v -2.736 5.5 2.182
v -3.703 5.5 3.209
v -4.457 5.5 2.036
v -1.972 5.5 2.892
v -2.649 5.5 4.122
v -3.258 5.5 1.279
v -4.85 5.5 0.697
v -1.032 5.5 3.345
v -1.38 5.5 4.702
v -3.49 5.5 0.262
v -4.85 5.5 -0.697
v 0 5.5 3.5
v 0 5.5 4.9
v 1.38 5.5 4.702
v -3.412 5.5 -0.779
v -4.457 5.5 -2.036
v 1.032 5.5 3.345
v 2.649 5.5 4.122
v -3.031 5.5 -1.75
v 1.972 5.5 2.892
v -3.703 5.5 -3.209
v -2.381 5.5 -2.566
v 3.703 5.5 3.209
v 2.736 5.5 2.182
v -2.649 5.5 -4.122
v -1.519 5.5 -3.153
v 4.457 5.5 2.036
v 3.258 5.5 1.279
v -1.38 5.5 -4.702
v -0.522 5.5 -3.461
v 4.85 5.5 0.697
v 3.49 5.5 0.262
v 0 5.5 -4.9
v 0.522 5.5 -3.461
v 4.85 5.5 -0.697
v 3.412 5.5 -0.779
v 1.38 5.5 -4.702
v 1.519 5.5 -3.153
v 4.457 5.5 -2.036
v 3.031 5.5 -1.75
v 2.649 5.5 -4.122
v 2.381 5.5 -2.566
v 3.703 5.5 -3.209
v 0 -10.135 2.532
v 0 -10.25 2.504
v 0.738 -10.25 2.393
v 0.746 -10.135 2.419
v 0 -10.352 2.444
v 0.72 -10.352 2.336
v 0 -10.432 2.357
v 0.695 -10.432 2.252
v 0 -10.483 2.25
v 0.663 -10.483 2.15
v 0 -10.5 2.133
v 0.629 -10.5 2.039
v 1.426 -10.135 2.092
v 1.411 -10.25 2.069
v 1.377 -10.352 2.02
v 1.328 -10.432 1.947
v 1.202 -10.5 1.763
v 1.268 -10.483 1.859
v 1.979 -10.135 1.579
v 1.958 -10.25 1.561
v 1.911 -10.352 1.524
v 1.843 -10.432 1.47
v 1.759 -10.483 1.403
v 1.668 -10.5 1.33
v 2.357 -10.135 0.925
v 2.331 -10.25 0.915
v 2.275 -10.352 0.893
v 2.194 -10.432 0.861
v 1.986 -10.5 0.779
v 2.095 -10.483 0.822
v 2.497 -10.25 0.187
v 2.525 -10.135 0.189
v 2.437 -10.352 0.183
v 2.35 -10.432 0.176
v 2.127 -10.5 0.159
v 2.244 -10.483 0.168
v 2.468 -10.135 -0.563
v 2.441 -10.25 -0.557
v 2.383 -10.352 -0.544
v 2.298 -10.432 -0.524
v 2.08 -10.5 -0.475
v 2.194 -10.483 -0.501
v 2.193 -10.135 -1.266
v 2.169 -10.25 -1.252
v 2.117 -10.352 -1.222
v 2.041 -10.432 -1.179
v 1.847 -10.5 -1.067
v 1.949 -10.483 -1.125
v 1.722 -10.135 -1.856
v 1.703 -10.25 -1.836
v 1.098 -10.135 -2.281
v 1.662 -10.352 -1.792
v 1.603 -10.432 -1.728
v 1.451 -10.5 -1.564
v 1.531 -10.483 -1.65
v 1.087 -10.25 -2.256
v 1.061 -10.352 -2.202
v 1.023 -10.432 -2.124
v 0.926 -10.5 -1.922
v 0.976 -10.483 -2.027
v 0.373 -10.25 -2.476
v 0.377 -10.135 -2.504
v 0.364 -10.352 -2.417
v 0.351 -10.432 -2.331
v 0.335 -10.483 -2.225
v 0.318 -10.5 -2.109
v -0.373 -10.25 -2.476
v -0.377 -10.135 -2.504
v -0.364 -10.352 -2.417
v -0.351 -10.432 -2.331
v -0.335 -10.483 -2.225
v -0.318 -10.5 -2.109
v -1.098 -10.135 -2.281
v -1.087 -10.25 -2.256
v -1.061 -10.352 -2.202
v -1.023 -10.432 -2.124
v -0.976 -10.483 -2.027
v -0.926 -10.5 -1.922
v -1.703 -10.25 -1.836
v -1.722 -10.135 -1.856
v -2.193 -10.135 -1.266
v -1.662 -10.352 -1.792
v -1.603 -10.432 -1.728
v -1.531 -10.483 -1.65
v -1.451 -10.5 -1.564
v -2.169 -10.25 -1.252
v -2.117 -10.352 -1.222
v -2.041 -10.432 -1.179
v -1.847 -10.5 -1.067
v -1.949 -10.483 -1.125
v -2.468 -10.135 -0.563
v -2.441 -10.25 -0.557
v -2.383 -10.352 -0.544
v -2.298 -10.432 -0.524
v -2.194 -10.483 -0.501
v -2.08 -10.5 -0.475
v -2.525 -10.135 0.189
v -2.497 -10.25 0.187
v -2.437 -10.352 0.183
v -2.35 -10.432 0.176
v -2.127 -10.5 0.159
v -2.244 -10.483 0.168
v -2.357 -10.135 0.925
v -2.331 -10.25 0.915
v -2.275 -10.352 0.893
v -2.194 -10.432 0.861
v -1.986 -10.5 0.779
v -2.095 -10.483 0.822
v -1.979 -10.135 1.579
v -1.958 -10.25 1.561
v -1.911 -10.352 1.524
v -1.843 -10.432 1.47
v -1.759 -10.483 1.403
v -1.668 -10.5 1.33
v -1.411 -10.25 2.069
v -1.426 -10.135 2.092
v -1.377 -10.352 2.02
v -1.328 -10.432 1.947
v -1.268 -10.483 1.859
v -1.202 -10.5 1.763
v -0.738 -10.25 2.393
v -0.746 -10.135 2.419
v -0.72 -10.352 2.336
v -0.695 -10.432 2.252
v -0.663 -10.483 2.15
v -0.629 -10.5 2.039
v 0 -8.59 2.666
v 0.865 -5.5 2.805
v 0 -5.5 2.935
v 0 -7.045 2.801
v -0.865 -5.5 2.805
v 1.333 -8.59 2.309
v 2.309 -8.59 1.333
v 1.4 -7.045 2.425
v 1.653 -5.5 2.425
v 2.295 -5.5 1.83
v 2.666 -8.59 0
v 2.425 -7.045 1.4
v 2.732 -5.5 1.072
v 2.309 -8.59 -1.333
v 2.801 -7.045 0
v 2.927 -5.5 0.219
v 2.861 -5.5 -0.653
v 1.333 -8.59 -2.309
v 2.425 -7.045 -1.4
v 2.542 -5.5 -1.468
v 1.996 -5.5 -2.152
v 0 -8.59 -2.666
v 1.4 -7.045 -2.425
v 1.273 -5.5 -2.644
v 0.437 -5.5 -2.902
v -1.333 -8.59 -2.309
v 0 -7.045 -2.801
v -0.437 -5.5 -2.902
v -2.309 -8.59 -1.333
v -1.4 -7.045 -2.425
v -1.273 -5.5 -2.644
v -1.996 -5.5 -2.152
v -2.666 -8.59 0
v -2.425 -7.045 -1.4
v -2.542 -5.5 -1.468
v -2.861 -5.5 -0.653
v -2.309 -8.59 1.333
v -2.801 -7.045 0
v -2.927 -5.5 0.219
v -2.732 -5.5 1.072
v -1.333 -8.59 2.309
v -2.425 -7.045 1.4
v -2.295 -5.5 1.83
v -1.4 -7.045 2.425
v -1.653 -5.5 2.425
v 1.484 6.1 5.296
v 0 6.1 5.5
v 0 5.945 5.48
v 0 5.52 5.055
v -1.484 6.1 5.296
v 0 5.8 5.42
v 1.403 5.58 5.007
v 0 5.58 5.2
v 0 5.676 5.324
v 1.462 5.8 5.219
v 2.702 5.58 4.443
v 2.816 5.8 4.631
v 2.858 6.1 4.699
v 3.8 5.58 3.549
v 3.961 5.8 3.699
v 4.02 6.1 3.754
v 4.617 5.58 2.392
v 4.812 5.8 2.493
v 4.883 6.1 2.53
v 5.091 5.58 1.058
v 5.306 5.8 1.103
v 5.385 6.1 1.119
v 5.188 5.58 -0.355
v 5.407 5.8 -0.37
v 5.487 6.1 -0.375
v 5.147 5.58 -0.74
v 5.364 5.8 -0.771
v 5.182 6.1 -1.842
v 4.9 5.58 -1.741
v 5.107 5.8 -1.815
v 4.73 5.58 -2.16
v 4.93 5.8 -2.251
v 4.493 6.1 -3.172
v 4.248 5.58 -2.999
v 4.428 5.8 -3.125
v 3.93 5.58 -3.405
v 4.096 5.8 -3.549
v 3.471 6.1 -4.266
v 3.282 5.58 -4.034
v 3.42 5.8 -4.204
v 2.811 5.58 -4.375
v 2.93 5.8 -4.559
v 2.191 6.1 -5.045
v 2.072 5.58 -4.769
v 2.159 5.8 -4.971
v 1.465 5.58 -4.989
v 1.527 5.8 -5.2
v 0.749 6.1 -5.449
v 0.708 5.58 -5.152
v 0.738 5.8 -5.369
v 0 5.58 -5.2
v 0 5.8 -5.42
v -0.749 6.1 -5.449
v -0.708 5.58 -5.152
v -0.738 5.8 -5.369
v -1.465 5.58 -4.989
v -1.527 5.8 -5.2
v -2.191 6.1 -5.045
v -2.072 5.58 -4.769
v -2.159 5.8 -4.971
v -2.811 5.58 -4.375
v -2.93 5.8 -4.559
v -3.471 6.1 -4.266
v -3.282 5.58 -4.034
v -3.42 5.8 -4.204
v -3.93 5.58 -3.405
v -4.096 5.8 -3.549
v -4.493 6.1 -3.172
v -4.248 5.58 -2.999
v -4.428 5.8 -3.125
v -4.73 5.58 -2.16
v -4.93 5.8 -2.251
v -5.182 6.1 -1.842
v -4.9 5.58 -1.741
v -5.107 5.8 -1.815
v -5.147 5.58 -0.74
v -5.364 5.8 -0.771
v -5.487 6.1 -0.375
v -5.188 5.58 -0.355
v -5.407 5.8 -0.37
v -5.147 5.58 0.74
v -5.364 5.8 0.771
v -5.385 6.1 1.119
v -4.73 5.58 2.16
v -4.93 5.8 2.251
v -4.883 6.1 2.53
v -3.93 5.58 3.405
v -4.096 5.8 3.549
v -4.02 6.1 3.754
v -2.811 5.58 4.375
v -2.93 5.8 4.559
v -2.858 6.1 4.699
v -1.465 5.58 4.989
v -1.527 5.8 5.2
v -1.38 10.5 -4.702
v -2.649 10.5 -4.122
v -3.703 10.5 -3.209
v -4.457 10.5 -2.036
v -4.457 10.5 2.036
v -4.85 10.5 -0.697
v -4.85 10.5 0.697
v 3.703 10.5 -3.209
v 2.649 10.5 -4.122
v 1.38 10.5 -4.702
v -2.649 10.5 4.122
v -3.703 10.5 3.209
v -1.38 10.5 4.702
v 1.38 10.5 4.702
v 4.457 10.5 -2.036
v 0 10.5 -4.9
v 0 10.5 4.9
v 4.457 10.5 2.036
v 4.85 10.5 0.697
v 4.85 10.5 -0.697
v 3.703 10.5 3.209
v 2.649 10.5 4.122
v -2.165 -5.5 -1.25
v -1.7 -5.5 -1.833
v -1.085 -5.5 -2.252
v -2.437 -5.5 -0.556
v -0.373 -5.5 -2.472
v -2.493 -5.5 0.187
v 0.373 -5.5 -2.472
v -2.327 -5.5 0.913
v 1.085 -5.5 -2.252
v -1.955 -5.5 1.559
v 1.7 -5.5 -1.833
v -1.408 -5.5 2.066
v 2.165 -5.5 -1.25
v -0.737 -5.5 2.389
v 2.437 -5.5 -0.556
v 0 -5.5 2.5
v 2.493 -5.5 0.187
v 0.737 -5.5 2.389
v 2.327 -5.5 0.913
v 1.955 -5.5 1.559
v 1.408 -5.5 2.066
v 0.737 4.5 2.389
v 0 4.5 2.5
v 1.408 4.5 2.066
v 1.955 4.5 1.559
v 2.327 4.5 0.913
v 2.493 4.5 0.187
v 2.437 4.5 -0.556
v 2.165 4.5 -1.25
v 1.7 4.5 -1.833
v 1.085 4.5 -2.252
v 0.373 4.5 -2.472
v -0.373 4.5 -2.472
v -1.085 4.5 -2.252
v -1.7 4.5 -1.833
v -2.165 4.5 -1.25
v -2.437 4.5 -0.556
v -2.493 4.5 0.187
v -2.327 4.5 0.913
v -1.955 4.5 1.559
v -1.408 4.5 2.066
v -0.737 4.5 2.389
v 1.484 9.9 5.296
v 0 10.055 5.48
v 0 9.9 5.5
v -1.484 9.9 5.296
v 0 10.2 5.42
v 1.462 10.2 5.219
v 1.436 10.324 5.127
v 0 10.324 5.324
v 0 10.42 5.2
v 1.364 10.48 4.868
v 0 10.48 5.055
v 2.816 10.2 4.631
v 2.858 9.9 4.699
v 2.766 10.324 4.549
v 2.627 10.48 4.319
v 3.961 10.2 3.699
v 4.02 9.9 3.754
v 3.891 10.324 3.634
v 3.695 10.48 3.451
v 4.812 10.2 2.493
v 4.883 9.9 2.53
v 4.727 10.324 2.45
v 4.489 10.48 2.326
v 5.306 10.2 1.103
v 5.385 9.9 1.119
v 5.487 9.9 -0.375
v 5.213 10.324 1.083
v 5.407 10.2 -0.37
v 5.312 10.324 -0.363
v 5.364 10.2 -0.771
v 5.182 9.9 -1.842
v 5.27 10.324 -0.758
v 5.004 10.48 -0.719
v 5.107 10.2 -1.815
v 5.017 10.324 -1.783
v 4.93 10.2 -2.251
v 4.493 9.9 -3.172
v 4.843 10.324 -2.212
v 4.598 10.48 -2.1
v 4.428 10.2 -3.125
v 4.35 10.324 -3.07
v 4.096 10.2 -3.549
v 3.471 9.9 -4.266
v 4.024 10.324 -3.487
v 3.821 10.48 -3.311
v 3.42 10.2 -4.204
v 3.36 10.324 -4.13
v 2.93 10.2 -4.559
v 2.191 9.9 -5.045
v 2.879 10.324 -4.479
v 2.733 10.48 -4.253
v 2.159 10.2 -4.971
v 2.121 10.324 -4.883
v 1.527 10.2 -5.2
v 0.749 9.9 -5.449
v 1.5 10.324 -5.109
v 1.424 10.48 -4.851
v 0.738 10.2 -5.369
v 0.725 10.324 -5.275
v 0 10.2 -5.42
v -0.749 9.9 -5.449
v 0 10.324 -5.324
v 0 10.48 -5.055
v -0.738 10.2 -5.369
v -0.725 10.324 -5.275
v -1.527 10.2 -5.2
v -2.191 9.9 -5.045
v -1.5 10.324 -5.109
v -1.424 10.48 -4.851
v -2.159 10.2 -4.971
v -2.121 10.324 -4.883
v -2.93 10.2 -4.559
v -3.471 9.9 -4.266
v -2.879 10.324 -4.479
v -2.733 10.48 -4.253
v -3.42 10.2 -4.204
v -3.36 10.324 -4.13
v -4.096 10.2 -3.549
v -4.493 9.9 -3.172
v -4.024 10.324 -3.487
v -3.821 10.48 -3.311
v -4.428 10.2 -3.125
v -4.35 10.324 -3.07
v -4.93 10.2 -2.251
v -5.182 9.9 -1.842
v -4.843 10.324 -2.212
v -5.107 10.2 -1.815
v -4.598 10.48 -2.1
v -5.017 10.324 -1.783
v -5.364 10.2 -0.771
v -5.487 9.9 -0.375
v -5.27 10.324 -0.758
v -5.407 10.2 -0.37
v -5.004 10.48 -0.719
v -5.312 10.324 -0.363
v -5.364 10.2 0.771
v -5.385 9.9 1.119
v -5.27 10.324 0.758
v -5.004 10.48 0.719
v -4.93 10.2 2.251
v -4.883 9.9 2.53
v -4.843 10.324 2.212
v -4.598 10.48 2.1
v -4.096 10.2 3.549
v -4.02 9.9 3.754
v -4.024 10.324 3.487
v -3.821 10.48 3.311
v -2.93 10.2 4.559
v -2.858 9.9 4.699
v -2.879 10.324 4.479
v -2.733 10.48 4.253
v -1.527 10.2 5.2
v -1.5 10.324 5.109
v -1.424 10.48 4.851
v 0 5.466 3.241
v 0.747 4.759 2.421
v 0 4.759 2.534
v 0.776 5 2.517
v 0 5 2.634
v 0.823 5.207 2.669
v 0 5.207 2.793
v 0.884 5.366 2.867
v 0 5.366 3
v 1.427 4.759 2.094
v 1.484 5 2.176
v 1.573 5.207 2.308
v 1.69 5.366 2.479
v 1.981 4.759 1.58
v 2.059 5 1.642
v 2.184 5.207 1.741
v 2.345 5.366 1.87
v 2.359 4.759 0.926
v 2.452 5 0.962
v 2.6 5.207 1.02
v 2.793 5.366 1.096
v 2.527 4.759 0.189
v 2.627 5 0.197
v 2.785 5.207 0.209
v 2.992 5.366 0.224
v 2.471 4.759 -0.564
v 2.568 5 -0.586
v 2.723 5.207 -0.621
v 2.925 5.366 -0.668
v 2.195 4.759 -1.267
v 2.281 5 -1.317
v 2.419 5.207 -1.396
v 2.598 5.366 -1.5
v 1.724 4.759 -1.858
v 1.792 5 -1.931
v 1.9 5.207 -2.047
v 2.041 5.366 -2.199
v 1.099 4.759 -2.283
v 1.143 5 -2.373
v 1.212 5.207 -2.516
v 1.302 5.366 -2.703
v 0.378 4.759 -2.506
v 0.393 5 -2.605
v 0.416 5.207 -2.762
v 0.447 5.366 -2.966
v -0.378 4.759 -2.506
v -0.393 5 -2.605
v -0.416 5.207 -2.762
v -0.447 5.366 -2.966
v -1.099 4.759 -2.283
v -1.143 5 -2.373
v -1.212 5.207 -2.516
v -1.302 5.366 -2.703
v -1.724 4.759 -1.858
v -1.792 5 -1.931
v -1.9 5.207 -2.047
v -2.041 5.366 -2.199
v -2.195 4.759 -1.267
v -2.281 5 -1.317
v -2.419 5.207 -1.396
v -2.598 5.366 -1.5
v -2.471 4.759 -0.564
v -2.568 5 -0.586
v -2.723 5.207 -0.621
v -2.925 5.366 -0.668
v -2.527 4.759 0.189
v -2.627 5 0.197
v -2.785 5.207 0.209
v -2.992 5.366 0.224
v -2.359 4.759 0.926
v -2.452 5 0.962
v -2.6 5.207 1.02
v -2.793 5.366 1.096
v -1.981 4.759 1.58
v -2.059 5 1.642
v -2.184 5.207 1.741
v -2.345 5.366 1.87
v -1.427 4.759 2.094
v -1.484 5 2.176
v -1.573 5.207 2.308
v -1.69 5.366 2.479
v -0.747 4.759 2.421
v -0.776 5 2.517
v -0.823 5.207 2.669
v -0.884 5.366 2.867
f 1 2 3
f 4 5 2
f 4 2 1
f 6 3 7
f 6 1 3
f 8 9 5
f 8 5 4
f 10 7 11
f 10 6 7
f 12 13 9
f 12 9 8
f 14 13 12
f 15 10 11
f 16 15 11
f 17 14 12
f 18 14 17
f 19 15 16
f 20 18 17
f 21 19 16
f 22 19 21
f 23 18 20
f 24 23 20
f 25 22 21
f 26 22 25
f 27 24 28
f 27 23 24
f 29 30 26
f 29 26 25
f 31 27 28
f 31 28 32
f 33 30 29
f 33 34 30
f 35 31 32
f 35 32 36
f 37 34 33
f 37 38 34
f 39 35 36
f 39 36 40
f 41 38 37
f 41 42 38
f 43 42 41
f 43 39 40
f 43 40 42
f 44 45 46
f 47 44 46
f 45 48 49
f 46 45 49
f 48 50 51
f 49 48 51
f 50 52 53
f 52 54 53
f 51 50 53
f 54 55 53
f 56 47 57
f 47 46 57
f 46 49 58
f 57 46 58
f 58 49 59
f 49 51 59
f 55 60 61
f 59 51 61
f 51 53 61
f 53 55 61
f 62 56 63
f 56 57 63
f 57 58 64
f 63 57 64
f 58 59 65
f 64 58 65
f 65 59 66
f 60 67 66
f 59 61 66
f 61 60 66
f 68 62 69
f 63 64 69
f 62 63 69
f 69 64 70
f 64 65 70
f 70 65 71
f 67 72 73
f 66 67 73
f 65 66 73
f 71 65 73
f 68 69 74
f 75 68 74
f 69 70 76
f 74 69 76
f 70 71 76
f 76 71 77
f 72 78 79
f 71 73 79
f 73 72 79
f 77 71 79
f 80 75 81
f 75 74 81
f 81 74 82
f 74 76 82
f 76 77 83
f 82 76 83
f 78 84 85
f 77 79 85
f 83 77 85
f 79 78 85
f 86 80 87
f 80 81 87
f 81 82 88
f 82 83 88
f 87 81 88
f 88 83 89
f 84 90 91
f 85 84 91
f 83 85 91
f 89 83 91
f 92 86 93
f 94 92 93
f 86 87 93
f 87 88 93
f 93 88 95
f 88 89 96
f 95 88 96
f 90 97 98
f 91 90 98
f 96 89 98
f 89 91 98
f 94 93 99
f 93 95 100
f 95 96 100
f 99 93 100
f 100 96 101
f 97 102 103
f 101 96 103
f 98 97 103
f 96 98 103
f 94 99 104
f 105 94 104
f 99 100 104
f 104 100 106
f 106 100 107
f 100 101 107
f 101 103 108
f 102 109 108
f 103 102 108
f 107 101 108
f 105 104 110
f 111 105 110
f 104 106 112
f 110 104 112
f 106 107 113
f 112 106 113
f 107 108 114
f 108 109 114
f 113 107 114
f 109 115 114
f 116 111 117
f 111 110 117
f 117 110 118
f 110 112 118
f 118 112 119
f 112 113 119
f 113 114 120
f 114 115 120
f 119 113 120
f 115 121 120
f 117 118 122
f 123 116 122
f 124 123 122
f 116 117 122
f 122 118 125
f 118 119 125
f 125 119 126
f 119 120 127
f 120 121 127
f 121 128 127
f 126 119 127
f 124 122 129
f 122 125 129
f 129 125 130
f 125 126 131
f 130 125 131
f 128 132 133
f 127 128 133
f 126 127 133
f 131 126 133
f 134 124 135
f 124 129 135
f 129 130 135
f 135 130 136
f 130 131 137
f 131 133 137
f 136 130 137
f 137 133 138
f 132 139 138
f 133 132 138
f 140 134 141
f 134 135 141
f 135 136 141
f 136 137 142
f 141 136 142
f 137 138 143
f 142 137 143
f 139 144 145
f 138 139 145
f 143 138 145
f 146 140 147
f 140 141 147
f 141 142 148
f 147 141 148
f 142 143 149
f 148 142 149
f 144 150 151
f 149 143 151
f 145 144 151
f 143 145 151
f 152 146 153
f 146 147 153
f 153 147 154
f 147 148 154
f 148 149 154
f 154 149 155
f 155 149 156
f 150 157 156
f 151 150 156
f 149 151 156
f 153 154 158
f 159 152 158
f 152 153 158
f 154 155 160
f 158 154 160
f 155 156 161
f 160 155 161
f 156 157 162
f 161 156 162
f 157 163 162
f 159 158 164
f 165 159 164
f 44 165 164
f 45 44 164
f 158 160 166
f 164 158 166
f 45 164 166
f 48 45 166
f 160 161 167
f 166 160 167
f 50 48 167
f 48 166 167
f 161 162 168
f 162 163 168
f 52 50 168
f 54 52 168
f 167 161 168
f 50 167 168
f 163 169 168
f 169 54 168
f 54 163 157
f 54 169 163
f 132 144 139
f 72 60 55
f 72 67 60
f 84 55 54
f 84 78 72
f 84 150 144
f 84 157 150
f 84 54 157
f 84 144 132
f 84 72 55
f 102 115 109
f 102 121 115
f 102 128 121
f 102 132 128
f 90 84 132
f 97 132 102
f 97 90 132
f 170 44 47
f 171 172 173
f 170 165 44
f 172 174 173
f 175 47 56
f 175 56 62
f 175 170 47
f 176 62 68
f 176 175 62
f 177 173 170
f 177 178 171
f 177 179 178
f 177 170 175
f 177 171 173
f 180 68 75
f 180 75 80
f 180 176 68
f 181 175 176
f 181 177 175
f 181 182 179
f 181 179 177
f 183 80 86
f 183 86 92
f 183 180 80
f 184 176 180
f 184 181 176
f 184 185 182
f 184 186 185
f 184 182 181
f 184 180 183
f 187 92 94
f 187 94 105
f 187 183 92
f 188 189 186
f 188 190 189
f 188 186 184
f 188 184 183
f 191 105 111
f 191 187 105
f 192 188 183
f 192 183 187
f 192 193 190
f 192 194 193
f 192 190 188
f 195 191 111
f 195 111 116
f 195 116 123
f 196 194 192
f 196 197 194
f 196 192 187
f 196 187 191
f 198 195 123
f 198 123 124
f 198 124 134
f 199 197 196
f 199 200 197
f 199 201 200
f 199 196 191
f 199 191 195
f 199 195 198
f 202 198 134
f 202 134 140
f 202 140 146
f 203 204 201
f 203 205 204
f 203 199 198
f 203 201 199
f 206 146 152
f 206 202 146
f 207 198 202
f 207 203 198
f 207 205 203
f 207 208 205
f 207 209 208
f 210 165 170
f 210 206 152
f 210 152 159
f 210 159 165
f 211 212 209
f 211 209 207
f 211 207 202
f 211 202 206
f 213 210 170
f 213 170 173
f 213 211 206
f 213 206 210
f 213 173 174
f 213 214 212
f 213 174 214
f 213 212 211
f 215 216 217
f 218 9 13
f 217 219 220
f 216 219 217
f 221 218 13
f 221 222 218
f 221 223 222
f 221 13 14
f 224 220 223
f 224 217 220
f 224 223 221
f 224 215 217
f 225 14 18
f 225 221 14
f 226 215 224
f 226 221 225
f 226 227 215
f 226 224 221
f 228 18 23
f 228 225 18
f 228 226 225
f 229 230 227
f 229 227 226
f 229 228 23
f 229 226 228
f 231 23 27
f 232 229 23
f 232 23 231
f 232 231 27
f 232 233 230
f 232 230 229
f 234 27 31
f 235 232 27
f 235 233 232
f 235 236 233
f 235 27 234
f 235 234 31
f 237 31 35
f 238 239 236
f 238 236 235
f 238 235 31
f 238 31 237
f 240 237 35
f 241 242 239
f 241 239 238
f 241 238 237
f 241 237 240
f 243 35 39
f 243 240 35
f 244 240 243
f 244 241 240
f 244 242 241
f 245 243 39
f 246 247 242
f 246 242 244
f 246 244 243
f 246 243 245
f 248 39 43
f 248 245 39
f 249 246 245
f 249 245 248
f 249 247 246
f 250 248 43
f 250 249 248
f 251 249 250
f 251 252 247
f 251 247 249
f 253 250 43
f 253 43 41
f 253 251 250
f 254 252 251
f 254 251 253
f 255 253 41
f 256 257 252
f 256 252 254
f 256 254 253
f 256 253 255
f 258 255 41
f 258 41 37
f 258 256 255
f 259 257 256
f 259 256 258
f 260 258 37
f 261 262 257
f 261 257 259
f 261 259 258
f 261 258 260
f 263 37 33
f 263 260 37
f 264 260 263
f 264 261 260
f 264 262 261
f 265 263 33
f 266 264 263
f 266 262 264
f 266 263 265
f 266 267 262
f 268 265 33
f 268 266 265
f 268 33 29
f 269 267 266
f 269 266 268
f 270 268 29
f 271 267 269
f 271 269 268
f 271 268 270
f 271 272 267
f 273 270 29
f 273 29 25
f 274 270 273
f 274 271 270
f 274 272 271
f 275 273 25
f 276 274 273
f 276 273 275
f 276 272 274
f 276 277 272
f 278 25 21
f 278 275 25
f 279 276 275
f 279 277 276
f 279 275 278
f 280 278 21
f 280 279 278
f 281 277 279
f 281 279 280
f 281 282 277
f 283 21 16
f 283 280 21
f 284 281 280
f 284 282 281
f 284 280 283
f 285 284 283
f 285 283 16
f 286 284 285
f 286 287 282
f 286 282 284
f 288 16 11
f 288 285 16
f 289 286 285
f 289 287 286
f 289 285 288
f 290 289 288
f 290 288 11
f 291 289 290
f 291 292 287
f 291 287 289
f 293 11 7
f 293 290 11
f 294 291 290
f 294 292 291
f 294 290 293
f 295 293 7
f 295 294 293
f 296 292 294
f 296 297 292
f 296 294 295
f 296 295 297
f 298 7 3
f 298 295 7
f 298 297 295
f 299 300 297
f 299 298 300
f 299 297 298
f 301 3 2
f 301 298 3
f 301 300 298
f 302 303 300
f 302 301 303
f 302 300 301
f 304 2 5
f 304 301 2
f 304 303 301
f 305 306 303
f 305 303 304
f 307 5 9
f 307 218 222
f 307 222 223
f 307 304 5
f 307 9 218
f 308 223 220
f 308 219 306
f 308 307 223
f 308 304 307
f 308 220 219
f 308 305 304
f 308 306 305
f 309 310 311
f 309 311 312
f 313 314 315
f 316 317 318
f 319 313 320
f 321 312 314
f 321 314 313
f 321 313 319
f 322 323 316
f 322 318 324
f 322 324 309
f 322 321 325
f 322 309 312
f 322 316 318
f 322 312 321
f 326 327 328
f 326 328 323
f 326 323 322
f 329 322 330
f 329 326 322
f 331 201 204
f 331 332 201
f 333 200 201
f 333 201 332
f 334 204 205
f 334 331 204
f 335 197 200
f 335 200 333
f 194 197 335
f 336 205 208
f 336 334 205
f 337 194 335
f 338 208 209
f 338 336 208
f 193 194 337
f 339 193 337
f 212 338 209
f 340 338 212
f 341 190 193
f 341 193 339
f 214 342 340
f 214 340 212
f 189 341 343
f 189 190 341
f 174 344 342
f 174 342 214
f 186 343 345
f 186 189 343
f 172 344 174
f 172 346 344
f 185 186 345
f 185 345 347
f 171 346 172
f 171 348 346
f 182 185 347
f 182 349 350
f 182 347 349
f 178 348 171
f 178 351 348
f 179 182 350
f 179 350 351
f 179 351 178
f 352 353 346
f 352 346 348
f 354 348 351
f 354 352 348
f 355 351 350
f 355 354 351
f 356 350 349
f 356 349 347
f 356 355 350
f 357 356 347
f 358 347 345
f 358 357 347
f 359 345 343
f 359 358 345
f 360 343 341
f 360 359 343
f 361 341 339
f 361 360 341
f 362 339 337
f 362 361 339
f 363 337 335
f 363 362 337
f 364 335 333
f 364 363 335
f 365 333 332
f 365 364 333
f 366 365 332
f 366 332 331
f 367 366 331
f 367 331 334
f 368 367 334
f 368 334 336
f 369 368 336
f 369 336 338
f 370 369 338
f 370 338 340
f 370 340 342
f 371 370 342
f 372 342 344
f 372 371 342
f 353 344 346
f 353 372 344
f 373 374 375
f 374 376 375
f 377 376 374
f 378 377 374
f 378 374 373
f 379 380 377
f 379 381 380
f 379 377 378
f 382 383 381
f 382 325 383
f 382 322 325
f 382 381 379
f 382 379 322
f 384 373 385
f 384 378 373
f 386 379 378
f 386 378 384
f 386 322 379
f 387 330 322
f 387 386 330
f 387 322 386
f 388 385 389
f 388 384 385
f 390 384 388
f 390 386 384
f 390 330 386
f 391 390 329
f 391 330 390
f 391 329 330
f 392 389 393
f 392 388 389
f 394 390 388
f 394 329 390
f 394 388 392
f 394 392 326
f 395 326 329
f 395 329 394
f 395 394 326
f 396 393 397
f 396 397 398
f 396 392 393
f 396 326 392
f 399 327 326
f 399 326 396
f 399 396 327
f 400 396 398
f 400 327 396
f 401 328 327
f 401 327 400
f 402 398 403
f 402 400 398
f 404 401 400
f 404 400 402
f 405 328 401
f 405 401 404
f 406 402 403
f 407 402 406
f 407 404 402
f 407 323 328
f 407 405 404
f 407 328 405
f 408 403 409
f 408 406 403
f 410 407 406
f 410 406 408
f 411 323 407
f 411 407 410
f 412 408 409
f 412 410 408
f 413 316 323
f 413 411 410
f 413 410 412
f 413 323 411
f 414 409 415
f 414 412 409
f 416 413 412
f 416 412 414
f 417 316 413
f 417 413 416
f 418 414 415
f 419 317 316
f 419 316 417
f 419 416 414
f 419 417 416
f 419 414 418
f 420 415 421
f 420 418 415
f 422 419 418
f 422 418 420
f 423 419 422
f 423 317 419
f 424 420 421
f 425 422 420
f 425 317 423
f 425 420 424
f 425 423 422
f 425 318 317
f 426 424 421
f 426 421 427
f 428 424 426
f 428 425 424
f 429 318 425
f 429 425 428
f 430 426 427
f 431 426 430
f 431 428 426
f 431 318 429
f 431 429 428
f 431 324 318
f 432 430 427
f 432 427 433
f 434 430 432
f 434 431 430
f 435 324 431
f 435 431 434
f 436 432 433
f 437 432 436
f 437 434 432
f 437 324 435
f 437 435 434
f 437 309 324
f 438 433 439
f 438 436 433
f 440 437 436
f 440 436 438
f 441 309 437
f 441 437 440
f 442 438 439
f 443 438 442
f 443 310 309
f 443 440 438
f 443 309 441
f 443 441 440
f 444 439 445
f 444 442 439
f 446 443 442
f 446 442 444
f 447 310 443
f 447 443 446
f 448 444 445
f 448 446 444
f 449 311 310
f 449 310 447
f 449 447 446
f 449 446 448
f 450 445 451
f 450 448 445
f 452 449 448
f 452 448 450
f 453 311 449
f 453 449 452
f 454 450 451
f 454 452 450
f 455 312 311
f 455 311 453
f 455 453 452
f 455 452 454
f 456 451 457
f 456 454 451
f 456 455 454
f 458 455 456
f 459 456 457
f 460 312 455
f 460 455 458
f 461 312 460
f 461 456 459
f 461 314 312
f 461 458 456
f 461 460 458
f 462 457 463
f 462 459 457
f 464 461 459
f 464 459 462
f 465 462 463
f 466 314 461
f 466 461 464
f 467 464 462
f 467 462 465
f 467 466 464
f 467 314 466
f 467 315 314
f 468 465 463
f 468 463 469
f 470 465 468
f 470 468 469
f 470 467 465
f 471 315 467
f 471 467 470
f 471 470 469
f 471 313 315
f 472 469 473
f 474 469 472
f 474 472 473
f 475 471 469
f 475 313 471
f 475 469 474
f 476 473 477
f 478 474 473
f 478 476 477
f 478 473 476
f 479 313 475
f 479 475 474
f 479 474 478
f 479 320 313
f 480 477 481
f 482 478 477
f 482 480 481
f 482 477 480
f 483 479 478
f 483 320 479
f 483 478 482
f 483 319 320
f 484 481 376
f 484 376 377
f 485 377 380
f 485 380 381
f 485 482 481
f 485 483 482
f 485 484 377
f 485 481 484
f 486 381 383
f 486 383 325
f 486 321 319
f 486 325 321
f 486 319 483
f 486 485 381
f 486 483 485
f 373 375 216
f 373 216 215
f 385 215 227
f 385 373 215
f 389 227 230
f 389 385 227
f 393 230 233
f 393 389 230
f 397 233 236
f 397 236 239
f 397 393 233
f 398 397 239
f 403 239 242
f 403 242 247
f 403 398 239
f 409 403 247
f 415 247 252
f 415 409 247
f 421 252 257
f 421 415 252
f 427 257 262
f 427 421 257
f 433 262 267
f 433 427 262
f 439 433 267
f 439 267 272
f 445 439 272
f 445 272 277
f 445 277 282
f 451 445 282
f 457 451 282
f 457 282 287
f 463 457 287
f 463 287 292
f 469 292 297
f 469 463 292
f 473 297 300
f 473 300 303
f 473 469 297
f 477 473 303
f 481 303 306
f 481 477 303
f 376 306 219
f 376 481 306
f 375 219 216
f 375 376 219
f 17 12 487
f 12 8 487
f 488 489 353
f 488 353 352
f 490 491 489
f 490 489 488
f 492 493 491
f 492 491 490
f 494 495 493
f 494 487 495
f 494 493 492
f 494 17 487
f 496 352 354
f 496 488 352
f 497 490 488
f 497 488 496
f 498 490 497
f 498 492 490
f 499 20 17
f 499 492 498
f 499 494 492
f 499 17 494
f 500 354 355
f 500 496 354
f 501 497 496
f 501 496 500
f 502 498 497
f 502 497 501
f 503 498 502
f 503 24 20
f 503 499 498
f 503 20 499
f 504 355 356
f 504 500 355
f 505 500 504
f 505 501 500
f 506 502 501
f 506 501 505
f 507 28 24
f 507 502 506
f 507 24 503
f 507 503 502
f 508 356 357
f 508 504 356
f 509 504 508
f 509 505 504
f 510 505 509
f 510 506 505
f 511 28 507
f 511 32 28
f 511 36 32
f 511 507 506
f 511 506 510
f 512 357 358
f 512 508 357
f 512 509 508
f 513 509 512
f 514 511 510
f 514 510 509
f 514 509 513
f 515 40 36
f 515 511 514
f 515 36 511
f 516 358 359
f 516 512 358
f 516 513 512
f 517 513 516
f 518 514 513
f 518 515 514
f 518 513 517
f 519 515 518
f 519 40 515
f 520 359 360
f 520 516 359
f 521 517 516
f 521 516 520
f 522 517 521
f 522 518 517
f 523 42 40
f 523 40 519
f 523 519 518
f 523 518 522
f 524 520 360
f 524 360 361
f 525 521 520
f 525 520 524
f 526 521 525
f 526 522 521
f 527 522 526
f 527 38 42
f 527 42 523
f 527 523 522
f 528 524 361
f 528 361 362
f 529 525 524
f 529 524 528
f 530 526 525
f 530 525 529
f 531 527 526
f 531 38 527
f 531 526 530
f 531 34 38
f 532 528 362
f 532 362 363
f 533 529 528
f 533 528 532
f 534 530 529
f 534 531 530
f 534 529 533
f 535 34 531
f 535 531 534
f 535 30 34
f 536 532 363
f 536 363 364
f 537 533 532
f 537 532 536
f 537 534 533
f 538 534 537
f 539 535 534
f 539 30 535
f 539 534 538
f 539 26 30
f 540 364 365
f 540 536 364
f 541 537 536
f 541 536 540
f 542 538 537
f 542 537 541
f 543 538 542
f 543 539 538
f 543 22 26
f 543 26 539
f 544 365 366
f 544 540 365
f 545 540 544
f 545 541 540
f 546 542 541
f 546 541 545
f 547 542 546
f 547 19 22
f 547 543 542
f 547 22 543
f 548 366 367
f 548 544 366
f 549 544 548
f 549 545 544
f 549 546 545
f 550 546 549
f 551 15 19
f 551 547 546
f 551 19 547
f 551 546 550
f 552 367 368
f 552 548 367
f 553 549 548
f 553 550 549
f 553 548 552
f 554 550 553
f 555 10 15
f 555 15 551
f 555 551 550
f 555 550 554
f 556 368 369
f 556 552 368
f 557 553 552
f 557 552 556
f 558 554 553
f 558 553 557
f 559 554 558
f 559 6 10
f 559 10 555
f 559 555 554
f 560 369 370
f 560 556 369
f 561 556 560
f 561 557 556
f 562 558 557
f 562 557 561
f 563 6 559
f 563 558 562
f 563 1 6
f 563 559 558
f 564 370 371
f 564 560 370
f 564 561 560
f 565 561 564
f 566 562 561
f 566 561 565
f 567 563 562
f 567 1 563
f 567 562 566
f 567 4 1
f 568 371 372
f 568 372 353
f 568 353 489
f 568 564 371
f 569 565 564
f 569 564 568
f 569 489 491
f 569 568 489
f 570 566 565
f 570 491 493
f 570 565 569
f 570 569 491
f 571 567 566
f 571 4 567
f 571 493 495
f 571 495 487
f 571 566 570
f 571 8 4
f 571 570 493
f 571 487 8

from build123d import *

# Parameters (mm, degrees)
FILLET_R    = 0.4
FILLET001_R = 1
FILLET002_R = 0.6


with BuildPart() as part:
    # Sketch → Revolution (revolve)
    with BuildSketch(Plane.YZ):
        Polygon((-10.5, 2.5), (-5.5, 2.935), (-5.5, 2.5), (5.5, 2.5), (5.5, 5.5), (10.5, 5.5), (10.5, 0), (-10.5, 0), align=None)
    revolve(axis=Axis((0, 0, 0), (0, 1, 0)))

    # Fillet
    fillet_edges = [part.edges().sort_by_distance(p)[0] for p in [
        (0, -10.5, -2.5),
    ]]
    fillet(fillet_edges, radius=FILLET_R)

    # Fillet001
    fillet001_edges = [part.edges().sort_by_distance(p)[0] for p in [
        (0, 5.5, -2.5),
    ]]
    fillet(fillet001_edges, radius=FILLET001_R)

    # Fillet002
    fillet002_edges = [part.edges().sort_by_distance(p)[0] for p in [
        (0, 5.5, -5.5),
        (0, 10.5, -5.5),
    ]]
    fillet(fillet002_edges, radius=FILLET002_R)


solid = part.part
